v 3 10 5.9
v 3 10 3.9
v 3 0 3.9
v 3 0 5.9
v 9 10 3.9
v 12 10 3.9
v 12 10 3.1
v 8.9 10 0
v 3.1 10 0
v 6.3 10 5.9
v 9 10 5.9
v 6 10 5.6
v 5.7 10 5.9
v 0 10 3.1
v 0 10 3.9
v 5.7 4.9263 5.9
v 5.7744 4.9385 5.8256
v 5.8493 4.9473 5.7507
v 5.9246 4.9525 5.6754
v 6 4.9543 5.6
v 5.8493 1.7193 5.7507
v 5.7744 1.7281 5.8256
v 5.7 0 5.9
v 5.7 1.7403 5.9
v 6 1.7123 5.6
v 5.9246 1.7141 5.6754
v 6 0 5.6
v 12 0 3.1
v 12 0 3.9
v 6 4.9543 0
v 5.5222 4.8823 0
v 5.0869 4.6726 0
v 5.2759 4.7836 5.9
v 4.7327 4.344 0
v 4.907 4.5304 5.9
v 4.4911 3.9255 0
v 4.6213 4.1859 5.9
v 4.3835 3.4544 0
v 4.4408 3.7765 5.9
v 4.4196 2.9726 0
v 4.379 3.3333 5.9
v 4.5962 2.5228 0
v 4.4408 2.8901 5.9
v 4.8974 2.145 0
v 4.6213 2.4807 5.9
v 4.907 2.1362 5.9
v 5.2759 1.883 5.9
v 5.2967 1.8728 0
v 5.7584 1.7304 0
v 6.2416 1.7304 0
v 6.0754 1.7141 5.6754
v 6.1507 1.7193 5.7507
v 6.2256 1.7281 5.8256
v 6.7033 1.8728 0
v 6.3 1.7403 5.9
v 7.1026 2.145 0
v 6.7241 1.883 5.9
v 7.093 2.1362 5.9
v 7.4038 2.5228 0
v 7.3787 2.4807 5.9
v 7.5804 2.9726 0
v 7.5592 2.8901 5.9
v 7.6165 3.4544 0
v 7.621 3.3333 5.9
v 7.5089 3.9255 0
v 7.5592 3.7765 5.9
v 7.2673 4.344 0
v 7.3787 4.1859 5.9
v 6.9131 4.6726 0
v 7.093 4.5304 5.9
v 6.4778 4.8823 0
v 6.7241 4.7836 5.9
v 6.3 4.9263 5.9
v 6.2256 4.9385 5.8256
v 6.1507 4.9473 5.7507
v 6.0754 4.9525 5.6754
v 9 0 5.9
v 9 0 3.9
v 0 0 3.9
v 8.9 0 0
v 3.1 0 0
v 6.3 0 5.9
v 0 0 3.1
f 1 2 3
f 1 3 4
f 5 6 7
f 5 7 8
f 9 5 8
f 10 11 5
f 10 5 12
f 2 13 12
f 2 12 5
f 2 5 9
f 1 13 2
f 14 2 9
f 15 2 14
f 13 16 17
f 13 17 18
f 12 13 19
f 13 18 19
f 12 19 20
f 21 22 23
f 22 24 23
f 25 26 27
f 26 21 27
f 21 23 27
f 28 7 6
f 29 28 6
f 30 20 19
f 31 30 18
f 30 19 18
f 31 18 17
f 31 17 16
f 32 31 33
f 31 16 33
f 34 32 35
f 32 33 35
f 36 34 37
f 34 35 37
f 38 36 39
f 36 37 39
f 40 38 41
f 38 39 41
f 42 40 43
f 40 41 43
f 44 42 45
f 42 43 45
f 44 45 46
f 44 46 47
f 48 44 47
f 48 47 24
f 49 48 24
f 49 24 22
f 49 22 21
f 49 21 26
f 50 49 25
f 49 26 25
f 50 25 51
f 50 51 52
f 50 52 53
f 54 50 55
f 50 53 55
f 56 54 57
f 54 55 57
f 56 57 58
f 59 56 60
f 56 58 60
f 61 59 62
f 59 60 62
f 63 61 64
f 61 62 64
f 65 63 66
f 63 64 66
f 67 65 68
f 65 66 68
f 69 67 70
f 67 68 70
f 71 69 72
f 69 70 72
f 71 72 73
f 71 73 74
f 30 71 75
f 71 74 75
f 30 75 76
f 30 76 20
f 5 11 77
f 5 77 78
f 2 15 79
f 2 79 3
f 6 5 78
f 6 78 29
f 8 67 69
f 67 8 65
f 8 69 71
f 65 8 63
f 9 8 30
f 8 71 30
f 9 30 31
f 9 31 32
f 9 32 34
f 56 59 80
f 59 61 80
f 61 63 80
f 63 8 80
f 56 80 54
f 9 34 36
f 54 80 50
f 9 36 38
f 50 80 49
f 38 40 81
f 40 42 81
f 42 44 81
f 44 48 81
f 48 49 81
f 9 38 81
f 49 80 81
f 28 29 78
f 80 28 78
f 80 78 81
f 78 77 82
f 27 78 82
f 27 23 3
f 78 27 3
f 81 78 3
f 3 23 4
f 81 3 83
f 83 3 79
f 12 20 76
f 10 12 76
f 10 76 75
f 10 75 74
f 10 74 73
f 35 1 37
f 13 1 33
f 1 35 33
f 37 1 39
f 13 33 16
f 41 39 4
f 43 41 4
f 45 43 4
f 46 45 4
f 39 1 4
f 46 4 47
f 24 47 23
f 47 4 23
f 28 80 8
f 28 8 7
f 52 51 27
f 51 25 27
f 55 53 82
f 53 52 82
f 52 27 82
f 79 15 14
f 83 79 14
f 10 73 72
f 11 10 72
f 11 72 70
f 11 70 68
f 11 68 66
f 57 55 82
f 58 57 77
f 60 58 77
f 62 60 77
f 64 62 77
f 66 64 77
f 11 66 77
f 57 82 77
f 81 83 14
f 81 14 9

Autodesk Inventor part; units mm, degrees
ref_plane "YZ Plane" through (0, 0, 0) normal (1, 0, 0) x (0, 1, 0)
ref_plane "XZ Plane" through (0, 0, 0) normal (0, 1, 0) x (-1, 0, 0)
ref_plane "XY Plane" through (0, 0, 0) normal (0, 0, 1) x (1, 0, 0)
sketch "Skizze3" plane through (0, 0, 0) normal (0, 1, 0) x (-1, 0, 0)
  line L0 (0, 3.9) -> (-3, 3.9)
  line L1 (-3, 3.9) -> (-3, 5.9)
  line L2 (0, 3.9) -> (0, 3.1)
  line L3 (0, 3.1) -> (-3.1, 0)
  line L4 (-3, 5.9) -> (-5.7, 5.9)
  line L5 (-5.7, 5.9) -> (-6, 5.6)
  line L6 (-6, 5.6) -> (-6, 0)
  line L7 (-6, 0) -> (-3.1, 0)
  point P0 (0, 0)
  dimension "d6" = 3
  dimension "d7" = 6
  dimension "d8" = 3.1
  dimension "d9" = 5.9
  dimension "d10" = 135
  dimension "d11" = 0.3
  dimension "d12" = 2
  dimension "d13" = 135
extrude "Extrusion3" add sketch "Skizze3" along normal blind 10
mirror "Spiegeln1" about plane through (6, 0, 5.6) normal (1, 0, 0) of "Extrusion3"
sketch "Skizze4" plane through (3.1, 0, 0) normal (0, 0, -1) x (-1, 0, 0)
  line L0 (0, 0) -> (0, 10) projected
  line L1 (-5.8, 0) -> (-5.8, 10) projected
  line L2 (-2.9, 0) -> (-2.9, 10) projected
  line L3 (0, 10) -> (-5.8, 10) projected
  line L4 (0, 0) -> (-5.8, 0) projected
  point P0 (3.1, 0)
  point P1 (-2.9, 3.3333)
  dimension "d23" = 10
  dimension "d24" = 3.3333
hole "Bohrung1" at (6, 3.3333, 0) direction (0, 0, 1) diameter 3.242 end through all thread size "M4x0.7" class "6H" standard "ISO Metric profile"
equation "\"d24\" = 0.333333 * d23"
properties part number "BTwnikel2_trajan20_21"
